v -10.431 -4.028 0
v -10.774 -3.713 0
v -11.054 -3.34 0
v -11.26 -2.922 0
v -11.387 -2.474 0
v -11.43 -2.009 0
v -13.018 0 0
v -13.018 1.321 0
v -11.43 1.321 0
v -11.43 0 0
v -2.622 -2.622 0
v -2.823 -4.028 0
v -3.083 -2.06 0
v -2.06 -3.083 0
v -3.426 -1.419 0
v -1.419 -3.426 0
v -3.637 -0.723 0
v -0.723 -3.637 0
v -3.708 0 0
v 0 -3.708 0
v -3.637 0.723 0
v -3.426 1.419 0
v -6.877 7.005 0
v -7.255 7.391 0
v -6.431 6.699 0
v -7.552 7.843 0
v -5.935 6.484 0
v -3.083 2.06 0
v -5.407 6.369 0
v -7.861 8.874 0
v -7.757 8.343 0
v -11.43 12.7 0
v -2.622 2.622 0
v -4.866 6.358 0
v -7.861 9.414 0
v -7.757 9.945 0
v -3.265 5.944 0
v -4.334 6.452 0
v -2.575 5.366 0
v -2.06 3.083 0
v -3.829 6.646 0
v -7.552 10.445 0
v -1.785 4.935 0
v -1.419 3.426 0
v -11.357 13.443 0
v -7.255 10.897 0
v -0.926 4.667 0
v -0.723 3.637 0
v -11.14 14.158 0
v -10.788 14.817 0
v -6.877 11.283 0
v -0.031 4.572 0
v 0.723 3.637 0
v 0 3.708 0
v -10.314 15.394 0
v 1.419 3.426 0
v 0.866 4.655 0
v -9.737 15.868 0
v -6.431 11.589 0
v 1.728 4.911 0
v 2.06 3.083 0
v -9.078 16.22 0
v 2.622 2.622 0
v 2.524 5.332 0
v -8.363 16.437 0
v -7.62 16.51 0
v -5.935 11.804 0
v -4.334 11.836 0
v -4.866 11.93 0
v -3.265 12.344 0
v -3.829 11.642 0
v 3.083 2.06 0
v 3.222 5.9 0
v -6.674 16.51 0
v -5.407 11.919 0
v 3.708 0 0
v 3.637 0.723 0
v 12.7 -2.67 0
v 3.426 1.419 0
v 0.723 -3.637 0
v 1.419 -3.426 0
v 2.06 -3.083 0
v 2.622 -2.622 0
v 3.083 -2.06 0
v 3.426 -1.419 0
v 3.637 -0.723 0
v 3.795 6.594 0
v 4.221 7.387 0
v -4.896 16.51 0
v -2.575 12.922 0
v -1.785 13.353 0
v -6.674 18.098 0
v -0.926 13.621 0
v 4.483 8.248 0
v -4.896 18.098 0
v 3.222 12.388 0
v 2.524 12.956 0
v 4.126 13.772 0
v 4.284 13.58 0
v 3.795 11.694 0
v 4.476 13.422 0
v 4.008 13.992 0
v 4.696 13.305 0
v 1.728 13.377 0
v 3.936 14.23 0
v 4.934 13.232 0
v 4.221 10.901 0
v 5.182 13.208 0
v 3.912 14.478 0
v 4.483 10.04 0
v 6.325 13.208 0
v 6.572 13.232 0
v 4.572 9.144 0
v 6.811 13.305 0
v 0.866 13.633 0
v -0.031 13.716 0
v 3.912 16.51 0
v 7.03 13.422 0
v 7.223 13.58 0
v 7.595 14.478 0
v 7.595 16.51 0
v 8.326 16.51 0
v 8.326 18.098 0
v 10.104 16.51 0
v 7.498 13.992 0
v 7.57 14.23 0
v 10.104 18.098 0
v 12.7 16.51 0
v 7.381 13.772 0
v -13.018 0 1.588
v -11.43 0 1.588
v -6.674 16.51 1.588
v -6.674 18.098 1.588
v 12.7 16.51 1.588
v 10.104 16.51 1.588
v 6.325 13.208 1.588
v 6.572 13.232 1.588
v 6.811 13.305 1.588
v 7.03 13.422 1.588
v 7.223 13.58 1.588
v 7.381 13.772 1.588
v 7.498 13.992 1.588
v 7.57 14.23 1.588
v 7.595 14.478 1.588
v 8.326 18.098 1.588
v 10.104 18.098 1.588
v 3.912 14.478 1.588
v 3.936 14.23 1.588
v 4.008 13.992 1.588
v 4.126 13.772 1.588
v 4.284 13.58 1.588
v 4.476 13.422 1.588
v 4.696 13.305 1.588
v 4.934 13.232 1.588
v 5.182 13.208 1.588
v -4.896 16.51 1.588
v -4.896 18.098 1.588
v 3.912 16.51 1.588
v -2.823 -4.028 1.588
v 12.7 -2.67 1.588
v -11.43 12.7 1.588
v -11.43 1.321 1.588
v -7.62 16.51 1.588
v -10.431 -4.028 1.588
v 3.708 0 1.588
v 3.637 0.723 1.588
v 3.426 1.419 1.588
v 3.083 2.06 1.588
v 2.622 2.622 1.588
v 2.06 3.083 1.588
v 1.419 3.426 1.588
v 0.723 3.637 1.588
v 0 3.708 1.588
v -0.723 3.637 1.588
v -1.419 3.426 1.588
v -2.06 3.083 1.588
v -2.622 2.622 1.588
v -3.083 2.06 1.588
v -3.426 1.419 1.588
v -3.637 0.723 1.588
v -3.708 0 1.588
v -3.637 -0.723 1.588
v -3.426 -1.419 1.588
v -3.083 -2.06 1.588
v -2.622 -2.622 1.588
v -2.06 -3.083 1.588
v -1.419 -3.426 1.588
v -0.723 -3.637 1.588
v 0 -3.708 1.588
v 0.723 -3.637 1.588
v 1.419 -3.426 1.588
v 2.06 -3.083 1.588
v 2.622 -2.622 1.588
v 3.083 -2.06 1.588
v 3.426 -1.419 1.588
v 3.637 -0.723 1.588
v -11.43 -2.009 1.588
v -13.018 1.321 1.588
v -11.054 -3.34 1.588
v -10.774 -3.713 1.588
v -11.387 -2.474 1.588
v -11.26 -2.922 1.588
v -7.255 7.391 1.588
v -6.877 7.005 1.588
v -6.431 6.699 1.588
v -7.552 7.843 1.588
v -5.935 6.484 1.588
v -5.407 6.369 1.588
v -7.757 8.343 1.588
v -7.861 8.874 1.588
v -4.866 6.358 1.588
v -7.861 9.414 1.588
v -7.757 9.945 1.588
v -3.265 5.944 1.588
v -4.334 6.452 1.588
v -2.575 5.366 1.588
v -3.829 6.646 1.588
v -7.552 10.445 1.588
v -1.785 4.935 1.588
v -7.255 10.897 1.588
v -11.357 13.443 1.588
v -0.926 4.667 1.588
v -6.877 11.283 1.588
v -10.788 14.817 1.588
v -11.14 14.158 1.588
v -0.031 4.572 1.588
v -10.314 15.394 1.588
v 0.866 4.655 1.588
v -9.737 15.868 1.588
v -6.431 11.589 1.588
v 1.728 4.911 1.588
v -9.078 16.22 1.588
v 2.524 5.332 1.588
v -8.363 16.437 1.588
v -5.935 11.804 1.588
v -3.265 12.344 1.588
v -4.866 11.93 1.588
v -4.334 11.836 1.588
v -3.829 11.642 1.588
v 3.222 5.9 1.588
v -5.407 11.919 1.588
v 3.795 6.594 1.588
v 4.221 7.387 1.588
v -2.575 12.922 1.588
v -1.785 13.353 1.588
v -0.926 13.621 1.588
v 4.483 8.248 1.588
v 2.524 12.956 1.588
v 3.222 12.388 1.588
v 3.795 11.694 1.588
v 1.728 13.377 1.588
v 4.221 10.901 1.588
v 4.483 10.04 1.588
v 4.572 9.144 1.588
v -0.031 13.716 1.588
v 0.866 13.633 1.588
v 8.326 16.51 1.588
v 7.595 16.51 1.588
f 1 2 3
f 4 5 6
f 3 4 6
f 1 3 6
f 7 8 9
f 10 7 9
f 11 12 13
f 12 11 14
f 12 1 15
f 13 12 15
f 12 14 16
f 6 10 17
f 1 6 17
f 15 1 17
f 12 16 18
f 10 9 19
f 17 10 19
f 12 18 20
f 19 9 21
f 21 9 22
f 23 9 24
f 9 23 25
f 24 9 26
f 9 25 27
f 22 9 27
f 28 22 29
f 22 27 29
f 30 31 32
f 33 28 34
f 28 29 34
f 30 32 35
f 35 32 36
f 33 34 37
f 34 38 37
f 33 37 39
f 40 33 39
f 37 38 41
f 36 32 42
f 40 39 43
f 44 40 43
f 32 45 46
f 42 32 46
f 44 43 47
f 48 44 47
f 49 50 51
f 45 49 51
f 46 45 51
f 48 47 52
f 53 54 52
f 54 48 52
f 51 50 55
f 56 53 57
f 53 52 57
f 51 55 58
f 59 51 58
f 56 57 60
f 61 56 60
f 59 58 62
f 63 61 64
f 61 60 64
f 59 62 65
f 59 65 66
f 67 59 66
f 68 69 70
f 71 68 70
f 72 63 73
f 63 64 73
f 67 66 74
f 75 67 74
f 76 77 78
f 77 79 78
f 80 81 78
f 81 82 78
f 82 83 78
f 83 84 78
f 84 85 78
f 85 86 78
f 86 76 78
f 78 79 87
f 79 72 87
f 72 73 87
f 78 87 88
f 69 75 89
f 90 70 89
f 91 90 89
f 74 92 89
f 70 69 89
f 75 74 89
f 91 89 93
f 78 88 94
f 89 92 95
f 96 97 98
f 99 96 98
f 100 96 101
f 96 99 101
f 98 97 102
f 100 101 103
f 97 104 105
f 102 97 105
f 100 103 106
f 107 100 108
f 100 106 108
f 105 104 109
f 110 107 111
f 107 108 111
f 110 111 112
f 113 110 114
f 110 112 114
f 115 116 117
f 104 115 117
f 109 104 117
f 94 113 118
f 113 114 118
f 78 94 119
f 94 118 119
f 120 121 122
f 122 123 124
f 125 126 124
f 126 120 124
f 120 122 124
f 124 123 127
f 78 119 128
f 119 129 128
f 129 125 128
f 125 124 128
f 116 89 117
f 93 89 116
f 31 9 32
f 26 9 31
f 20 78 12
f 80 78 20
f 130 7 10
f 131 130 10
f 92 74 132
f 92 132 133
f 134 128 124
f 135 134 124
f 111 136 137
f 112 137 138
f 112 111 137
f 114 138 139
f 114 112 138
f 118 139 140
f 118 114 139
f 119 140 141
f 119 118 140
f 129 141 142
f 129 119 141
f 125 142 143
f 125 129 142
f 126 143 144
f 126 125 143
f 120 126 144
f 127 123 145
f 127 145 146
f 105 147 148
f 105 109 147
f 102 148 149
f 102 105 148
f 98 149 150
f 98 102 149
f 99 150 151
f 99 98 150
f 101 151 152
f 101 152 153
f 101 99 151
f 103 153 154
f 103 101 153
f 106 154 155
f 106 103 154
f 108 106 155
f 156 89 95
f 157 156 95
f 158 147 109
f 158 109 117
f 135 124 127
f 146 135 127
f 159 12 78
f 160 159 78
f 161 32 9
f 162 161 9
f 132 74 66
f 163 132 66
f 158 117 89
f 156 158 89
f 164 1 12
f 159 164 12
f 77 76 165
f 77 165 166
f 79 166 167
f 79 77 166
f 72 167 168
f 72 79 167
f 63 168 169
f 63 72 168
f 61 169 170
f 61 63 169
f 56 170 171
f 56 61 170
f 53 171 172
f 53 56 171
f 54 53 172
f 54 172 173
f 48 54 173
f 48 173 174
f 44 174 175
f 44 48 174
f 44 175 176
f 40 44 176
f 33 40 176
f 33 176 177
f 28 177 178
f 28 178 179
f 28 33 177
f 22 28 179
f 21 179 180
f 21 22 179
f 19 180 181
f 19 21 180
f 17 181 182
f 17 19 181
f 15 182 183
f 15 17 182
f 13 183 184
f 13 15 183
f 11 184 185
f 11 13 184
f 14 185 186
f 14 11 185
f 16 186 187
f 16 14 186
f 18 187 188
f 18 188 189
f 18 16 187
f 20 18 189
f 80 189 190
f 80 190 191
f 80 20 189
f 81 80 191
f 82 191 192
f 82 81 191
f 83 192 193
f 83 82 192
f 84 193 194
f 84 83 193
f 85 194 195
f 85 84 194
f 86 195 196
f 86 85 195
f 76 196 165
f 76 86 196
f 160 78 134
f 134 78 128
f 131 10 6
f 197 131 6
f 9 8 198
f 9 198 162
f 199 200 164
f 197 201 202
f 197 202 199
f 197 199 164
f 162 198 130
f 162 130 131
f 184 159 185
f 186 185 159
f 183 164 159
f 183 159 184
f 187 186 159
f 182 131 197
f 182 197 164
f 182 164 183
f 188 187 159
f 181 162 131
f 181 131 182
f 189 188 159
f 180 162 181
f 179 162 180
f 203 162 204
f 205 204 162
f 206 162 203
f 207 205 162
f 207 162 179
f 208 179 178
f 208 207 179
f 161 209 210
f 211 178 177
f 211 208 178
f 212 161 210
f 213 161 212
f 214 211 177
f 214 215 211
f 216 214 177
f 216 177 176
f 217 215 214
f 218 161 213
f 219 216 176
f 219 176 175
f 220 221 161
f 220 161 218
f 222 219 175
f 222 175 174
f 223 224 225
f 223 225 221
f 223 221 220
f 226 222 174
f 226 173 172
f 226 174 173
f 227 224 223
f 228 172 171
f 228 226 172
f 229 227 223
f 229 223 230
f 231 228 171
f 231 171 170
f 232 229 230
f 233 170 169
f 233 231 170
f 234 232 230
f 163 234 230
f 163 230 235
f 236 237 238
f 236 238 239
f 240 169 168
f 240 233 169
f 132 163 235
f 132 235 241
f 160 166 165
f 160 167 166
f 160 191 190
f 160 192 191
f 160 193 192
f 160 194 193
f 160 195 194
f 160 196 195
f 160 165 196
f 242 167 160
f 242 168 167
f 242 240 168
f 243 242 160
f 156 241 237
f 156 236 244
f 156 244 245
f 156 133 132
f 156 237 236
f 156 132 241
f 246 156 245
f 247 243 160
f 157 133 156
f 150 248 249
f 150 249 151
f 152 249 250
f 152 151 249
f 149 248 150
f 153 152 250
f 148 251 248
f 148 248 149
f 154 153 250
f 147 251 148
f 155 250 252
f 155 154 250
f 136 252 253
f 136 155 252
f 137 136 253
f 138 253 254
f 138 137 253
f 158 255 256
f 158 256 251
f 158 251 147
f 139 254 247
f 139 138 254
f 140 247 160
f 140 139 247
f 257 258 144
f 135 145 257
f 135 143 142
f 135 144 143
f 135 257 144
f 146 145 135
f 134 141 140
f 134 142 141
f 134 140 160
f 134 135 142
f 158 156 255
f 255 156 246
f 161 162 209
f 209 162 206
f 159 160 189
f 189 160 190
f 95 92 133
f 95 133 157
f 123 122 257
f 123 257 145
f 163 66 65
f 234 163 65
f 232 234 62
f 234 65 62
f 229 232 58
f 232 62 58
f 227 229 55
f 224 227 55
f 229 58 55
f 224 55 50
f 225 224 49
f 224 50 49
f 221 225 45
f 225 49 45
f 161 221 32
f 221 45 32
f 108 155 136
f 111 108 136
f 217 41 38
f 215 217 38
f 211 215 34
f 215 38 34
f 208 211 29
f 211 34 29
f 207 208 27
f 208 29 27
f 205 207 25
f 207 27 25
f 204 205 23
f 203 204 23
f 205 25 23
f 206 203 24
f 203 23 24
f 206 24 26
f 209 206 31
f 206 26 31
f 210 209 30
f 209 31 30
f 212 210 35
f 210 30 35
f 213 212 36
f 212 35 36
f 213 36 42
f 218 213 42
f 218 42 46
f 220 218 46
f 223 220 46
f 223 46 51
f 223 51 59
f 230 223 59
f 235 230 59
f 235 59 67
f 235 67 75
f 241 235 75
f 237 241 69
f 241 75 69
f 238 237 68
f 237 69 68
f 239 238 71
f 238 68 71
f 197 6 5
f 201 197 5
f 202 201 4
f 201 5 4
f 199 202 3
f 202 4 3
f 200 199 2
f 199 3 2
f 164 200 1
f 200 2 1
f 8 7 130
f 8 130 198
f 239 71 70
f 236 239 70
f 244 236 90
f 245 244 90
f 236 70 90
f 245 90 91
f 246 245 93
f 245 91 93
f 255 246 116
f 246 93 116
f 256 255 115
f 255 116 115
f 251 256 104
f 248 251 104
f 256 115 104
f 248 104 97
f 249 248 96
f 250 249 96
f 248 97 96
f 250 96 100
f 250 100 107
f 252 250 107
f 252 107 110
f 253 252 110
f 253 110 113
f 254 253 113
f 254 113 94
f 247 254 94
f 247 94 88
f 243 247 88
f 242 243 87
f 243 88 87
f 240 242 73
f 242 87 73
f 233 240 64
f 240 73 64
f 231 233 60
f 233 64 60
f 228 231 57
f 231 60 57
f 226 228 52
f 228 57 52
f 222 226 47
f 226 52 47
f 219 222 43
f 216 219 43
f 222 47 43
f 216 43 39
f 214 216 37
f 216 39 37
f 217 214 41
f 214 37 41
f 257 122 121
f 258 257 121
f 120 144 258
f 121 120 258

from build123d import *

# Parameters (mm, degrees)
SKETCH1_R           = 3.7084
SKETCH1_W           = 1.778
SKETCH1_H           = 1.5875
SKETCH1_W_2         = 1.5875
SKETCH1_H_2         = 1.3208
BOSS_EXTRUDE1_DEPTH = 1.5875
SKETCH3_W           = 3.683
SKETCH3_H           = 3.302
CUT_EXTRUDE1_DEPTH  = 23.34938408
FILLET1_R           = 1.27


with BuildPart() as part:
    # Sketch1 → Boss-Extrude1 (new body)
    # profile 1 of 4: a face of its own
    with BuildSketch(Plane.XY):
        with BuildLine():
            Line((-10.431265191, -4.028360607), (-2.823309713, -4.028360607))
            Line((-2.823309713, -4.028360607), (12.7, -2.670246987))
            Line((12.7, -2.670246987), (12.7, 16.51))
            Line((12.7, 16.51), (10.10362126, 16.51))
            Line((10.10362126, 16.51), (8.32562126, 16.51))
            Line((8.32562126, 16.51), (-4.89637874, 16.51))
            Line((-4.89637874, 16.51), (-6.67437874, 16.51))
            Line((-6.67437874, 16.51), (-7.62, 16.51))
            ThreePointArc((-7.62, 16.51), (-10.314076836, 15.394076836), (-11.43, 12.7))
            Line((-11.43, 12.7), (-11.43, 1.3208))
            Line((-11.43, 1.3208), (-11.43, 0))
            Line((-11.43, 0), (-11.43, -2.009424845))
            ThreePointArc((-11.43, -2.009424845), (-11.166665718, -3.135654487), (-10.431265191, -4.028360607))
        make_face()
        Circle(SKETCH1_R, mode=Mode.SUBTRACT)
        with BuildLine():
            ThreePointArc((-3.82905, 11.642311449), (4.572, 9.144), (-3.82905, 6.645688551))
            ThreePointArc((-3.82905, 6.645688551), (-7.874, 9.144), (-3.82905, 11.642311449))
        make_face(mode=Mode.SUBTRACT)
    # profile 2 of 4: a face of its own
    with BuildSketch(Plane.XY):
        with Locations((-5.78537874, 17.30375)):
            Rectangle(SKETCH1_W, SKETCH1_H)
    # profile 3 of 4: a face of its own
    with BuildSketch(Plane.XY):
        with Locations((9.21462126, 17.30375)):
            Rectangle(SKETCH1_W, SKETCH1_H)
    # profile 4 of 4: a face of its own
    with BuildSketch(Plane.XY):
        with Locations((-12.22375, 0.6604)):
            Rectangle(SKETCH1_W_2, SKETCH1_H_2)
    extrude(amount=BOSS_EXTRUDE1_DEPTH)

    # Sketch3 → Cut-Extrude1 (cut, through all)
    with BuildSketch(Plane.XY.offset(1.5875)):
        with Locations((5.753177383, 14.859)):
            Rectangle(SKETCH3_W, SKETCH3_H)
    extrude(amount=-CUT_EXTRUDE1_DEPTH, mode=Mode.SUBTRACT)

    # Fillet1
    fillet1_edges = [part.edges().sort_by_distance(p)[0] for p in [
        (7.594677383, 13.208, 0.79375),
        (3.911677383, 13.208, 0.79375),
    ]]
    fillet(fillet1_edges, radius=FILLET1_R)


solid = part.part
